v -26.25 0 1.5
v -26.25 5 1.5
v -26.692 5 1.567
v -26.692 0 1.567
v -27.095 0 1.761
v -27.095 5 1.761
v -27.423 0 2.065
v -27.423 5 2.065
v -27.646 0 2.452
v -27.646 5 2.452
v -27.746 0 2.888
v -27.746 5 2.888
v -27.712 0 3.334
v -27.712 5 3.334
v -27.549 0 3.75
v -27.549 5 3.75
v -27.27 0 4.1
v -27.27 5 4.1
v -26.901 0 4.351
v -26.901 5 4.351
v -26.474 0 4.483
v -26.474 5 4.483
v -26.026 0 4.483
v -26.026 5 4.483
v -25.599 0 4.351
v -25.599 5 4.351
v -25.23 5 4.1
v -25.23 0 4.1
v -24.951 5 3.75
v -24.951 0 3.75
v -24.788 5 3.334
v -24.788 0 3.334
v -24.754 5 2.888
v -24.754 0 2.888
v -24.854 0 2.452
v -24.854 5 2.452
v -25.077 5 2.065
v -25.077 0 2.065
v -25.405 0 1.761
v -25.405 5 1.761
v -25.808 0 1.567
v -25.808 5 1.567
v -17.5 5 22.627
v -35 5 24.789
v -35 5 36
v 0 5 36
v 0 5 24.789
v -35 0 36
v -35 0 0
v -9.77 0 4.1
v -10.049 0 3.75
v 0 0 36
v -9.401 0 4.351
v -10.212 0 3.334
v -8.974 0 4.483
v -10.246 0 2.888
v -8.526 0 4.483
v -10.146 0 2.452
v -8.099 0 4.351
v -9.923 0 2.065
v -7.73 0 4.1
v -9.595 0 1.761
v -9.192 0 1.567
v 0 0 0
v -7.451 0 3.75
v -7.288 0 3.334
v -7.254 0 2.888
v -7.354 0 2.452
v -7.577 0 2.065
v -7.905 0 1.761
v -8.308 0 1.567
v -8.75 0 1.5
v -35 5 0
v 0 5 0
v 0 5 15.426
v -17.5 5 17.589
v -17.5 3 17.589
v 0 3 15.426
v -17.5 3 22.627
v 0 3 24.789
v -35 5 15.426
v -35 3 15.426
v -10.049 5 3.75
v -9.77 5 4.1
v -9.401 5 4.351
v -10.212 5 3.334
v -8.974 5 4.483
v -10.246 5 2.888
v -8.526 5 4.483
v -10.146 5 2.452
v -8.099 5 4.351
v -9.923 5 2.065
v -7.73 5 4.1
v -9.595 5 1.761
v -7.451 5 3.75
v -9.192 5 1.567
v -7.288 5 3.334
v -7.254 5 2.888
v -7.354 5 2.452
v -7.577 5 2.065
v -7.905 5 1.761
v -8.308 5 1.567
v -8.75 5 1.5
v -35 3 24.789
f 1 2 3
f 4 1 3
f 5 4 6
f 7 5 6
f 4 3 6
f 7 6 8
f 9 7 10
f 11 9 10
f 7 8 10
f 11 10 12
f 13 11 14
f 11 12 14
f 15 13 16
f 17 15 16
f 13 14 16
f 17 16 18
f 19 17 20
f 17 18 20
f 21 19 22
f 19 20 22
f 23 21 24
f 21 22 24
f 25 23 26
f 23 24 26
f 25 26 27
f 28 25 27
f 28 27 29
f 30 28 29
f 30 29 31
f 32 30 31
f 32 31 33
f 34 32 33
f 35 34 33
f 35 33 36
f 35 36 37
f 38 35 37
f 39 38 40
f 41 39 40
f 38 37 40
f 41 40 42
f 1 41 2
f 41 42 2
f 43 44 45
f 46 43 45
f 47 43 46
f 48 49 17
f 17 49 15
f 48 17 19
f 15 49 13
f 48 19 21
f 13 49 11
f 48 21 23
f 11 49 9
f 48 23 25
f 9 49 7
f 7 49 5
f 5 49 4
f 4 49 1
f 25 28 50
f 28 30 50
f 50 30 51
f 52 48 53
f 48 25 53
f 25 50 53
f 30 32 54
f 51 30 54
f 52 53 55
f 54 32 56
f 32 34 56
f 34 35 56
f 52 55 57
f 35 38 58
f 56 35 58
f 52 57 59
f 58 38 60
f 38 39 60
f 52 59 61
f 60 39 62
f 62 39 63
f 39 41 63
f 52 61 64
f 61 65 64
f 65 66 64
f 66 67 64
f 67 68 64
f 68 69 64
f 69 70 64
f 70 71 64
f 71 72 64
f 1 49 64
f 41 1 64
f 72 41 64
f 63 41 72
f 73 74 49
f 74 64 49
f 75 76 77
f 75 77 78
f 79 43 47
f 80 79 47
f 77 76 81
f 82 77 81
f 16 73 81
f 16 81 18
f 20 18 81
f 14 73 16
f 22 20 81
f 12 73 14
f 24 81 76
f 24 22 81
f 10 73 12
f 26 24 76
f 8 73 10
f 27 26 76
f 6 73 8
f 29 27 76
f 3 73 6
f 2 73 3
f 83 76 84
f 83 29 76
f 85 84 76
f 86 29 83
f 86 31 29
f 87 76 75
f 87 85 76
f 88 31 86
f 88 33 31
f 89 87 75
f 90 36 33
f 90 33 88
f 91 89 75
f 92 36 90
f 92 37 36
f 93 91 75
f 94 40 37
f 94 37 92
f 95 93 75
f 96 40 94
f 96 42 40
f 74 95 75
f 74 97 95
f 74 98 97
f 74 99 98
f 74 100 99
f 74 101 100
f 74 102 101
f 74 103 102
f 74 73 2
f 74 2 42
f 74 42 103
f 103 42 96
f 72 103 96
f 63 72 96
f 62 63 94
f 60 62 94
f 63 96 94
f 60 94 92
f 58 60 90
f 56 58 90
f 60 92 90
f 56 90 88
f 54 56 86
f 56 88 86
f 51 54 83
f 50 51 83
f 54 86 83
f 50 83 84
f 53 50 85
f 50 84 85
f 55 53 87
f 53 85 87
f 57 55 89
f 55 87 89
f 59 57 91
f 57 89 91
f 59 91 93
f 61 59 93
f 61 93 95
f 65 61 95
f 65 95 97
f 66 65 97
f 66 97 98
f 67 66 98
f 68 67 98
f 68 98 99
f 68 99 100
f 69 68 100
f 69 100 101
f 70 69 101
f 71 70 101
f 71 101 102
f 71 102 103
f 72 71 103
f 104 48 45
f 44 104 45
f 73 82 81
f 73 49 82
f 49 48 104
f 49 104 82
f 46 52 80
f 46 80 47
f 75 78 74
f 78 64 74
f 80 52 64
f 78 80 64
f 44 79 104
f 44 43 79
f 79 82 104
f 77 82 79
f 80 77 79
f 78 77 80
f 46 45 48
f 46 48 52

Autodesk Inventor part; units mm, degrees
ref_plane "YZ Plane" through (0, 0, 0) normal (1, 0, 0) x (0, 1, 0)
ref_plane "XZ Plane" through (0, 0, 0) normal (0, 1, 0) x (-1, 0, 0)
ref_plane "XY Plane" through (0, 0, 0) normal (0, 0, 1) x (1, 0, 0)
sketch "Sketch1" plane through (0, 0, 0) normal (0, 1, 0) x (-1, 0, 0)
  line L0 (0, 0) -> (35, 0)
  line L1 (35, 0) -> (35, 6)
  line L2 (0, 6) -> (35, 6)
  line L3 (0, 0) -> (0, 6)
  line L4 (0, 6) -> (0, 0)
  line L5 (0, 3) -> (35, 3)
  line L6 (17.5, 3) -> (35, 3)
  line L7 (17.5, 3) -> (0, 3)
  point P0 (17.5, 0)
  point P1 (8.75, 3)
  point P2 (26.25, 3)
extrude "Extrusion1" add sketch "Sketch1" along normal blind 5
sketch "Sketch2" plane through (-35, 0, 6) normal (0, 0, 1) x (1, 0, 0)
  line L0 (0, 0) -> (35, 0) projected
  line L1 (35, 0) -> (35, 5) projected
  line L2 (0, 5) -> (35, 5) projected
  line L3 (0, 0) -> (0, 5) projected
extrude "Extrusion2" add sketch "Sketch2" along normal blind 30
sketch "Sketch3" plane through (0, 5, 0) normal (0, 1, 0) x (1, 0, 0)
  line L0 (0, 0) -> (0, -36) projected
  line L1 (0, 0) -> (-35, 0) projected
  line L2 (-35, 0) -> (-35, -36) projected
  line L3 (0, -36) -> (-35, -36) projected
  line L4 (-35, 0) -> (-35, -36) projected
  line L5 (-35, -31) -> (0, -31)
  line L6 (0, -31) -> (0, -25)
  line L7 (0, -25) -> (-35, -25)
  line L8 (-35, -25) -> (-35, -31)
  dimension "d4" = 5
  dimension "d5" = 25
sketch "Sketch4" plane through (0, 0, 0) normal (0, -1, 0) x (1, 0, 0)
  line L0 (-35, 0) -> (0, 0)
  line L1 (0, 0) -> (0, 6)
  line L2 (-35, 6) -> (0, 6)
  line L3 (-35, 0) -> (-35, 6)
  line L4 (-35, 6) -> (-35, 0)
  line L5 (-35, 3) -> (0, 3)
  line L6 (-17.5, 3) -> (0, 3)
  line L7 (-17.5, 3) -> (-35, 3)
  point P0 (0, 0)
  point P1 (-17.5, 0)
  point P2 (-8.75, 3)
  point P3 (-26.25, 3)
hole "Hole1" at (-8.75, 0, 3) at (-26.25, 0, 3) direction (0, 1, 0) diameter 3 depth 8 tip angle 118
sketch "Sketch5" plane through (0, 5, 0) normal (0, 1, 0) x (1, 0, 0)
  line L0 (-99.5, -29.2319) -> (64.2547, -8.9987) projected
  line L1 (64.5, -10.9836) -> (-99.2547, -31.2168) projected
  line L2 (0, -20.4645) -> (-35, -24.789)
  line L3 (-35, -19.751) -> (0, -15.4265)
  line L4 (0, -15.4265) -> (0, -20.4645)
  line L5 (-35, -19.751) -> (-35, -24.789)
  dimension "d15" = 1.5
  dimension "d16" = 1.5
extrude "Extrusion4" cut sketch "Sketch5" against normal blind 2
sketch "Sketch7" plane through (0, 5, 0) normal (0, 1, 0) x (1, 0, 0)
  line L0 (0, -15.4265) -> (0, -20.4645)
  line L1 (0, -19.751) -> (0, -24.789)
  line L2 (-35, 0) -> (-35, -36) projected
  line L3 (-35, -36) -> (-35, -49.8548)
  line L4 (-35, -20.4645) -> (0, -24.789)
  line L5 (0, -19.751) -> (-35, -15.4265)
  line L6 (-35, -15.4265) -> (-35, -20.4645)
  line L7 (0, 0) -> (0, -36) projected
extrude "Extrusion5" cut sketch "Sketch7" against normal blind 2
properties part number "side_clip" material "ABS Plastic"
